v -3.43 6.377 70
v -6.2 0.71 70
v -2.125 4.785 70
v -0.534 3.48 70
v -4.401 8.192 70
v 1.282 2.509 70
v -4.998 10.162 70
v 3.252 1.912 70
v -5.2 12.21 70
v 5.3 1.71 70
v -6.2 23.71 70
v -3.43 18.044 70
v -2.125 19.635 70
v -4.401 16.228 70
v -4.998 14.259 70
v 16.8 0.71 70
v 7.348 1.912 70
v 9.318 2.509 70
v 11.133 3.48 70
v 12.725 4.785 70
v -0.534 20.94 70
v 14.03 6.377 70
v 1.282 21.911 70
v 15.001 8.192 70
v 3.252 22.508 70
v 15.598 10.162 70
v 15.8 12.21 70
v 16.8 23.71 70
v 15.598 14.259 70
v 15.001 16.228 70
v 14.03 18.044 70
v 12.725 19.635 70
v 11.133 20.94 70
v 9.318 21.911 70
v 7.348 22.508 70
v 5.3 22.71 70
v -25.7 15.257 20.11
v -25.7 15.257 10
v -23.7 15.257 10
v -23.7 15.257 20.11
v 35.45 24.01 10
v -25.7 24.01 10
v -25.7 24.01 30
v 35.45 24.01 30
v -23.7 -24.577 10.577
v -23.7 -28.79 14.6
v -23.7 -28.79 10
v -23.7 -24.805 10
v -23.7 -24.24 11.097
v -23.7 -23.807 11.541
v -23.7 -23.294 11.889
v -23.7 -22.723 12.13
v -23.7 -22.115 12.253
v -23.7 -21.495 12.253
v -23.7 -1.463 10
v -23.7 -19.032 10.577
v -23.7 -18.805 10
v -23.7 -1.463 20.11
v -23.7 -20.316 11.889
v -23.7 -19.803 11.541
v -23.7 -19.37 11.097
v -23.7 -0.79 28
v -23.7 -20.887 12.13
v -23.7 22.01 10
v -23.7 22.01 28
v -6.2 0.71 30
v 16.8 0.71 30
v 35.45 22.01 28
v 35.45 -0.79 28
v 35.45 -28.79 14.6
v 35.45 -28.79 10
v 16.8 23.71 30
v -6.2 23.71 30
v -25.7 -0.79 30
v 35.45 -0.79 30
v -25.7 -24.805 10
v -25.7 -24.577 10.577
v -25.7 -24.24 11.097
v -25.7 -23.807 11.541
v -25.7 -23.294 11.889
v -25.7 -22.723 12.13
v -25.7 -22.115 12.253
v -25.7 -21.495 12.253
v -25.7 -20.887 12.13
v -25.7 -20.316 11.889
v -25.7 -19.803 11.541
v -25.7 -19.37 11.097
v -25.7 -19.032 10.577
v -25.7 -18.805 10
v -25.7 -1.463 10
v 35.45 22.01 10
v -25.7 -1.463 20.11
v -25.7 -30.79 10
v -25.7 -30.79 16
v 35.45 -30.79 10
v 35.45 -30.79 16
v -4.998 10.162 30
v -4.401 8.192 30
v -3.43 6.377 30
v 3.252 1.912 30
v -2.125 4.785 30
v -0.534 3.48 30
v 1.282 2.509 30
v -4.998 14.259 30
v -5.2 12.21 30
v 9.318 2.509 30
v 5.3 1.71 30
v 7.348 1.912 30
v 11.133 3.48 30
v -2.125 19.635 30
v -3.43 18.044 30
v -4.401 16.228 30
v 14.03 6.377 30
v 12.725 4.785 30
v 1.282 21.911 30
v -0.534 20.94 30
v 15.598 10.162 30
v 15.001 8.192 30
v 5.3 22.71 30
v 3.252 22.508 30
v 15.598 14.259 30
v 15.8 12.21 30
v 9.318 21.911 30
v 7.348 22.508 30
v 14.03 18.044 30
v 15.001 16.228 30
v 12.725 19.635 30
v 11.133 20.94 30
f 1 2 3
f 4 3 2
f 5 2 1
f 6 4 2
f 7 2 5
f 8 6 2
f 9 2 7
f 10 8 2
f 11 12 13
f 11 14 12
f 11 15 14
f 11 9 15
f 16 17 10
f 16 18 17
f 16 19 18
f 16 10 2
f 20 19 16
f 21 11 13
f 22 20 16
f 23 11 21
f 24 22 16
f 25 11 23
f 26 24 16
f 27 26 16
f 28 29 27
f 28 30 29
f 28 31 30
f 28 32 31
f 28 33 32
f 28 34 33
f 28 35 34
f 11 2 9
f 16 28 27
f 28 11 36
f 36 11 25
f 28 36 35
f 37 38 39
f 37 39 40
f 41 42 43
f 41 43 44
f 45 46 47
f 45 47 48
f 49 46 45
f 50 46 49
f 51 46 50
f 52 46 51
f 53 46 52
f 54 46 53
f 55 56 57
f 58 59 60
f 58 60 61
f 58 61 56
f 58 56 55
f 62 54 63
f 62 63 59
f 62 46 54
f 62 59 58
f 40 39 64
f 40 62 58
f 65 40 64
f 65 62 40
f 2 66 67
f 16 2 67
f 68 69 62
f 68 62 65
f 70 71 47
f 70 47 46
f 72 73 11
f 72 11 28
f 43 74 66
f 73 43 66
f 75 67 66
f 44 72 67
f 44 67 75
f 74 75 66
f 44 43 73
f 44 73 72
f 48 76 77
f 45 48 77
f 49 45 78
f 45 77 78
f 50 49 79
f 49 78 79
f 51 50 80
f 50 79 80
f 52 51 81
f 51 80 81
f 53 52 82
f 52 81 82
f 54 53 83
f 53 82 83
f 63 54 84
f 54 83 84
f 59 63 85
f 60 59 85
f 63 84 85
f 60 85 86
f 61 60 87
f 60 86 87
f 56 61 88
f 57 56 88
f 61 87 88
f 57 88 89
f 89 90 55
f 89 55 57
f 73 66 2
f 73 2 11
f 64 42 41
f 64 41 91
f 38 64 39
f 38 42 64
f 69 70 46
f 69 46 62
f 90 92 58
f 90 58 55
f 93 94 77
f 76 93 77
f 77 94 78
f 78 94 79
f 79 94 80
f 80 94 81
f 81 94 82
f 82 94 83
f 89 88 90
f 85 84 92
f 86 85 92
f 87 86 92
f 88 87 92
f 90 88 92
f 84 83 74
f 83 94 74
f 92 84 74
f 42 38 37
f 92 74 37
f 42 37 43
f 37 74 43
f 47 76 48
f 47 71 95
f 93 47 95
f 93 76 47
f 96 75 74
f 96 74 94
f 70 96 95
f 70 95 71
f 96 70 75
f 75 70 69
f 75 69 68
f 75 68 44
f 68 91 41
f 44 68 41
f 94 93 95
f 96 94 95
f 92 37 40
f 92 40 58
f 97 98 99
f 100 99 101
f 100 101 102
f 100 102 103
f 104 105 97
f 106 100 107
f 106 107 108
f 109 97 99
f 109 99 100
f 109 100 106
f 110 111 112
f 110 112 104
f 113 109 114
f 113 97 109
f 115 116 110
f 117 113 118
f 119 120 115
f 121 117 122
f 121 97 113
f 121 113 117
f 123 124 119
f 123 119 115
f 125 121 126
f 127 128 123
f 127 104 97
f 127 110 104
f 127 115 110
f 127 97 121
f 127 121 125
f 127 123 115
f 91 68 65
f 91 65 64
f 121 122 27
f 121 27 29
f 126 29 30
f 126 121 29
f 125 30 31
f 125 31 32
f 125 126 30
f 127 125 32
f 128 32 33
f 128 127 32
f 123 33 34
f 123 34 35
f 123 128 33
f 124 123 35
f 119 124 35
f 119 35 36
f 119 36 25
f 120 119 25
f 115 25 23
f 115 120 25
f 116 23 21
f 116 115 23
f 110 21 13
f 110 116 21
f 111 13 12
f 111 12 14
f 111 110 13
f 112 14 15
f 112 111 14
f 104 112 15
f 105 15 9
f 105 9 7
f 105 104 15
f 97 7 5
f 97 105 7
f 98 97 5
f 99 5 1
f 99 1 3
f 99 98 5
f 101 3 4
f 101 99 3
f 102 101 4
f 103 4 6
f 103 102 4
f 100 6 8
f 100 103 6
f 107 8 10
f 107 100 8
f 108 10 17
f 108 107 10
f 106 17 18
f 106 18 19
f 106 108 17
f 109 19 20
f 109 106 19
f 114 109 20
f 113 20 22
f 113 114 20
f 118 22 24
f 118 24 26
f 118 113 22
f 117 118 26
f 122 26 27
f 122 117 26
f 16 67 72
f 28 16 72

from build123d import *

# Parameters (mm, degrees)
SKETCH004_W     = 61.15
SKETCH004_H     = 54.8
PAD001_DEPTH    = 20
POCKET003_DEPTH = 61.151
SKETCH006_R     = 3.34
SKETCH006_W     = 16.51
SKETCH006_H     = 11
POCKET004_DEPTH = 5
SKETCH007_R     = 3.34
SKETCH007_W     = 15.2570581741
SKETCH007_H     = 10.1100032783
POCKET005_DEPTH = 17
SKETCH008_W     = 23
SKETCH008_H     = 23
SKETCH008_R     = 10.5
PAD002_DEPTH    = 40
POCKET006_DEPTH = 61.151
PAD004_DEPTH    = 2


with BuildPart() as part:
    # Sketch004 → Pad001 (new body)
    with BuildSketch(Plane.XY):
        with Locations((4.8749828339, -3.3899418259)):
            Rectangle(SKETCH004_W, SKETCH004_H)
    extrude(amount=PAD001_DEPTH)

    # Sketch005 (on Face2 of Pad001) → Pocket003 (cut, through all)
    with BuildSketch(Plane.YZ.offset(35.4499828339)):
        Polygon((-30.7899418259, 20), (-0.7899418259, 20), (-30.7899418259, 6), align=None)
    extrude(amount=-POCKET003_DEPTH, mode=Mode.SUBTRACT)

    # Sketch006 (on Face3 of Pocket003) → Pocket004 (cut)
    with BuildSketch(Plane.YZ.offset(35.4499828339)):
        with Locations((-8.7709418259, -0.3499967217)):
            Circle(SKETCH006_R)
        with Locations((-21.8049418259, 0.1500032783)):
            Circle(SKETCH006_R)
        with Locations((6.7920581741, 4.6100032783)):
            Rectangle(SKETCH006_W, SKETCH006_H)
    extrude(amount=-POCKET004_DEPTH, mode=Mode.SUBTRACT)

    # Sketch007 (on Face2 of Pocket004) → Pocket005 (cut)
    with BuildSketch(Plane(origin=(-25.7000171661, 0, 0), x_dir=(0, -1, 0), z_dir=(-1, 0, 0))):
        with Locations((21.8049418259, -0.8499967217)):
            Circle(SKETCH007_R)
        with Locations((-7.6285290871, 5.0550016391)):
            Rectangle(SKETCH007_W, SKETCH007_H)
    extrude(amount=-POCKET005_DEPTH, mode=Mode.SUBTRACT)

    # Sketch008 (on Face5 of Pocket005) → Pad002 (join)
    with BuildSketch(Plane.XY.offset(20)):
        with Locations((5.2999828339, 12.2100581741)):
            Rectangle(SKETCH008_W, SKETCH008_H)
        with Locations((5.2999828339, 12.2100581741)):
            Circle(SKETCH008_R, mode=Mode.SUBTRACT)
    extrude(amount=PAD002_DEPTH)

    # Sketch010 (on Face3 of Pocket005) → Pocket006 (cut, through all)
    with BuildSketch(Plane.YZ.offset(35.4499828339)):
        Polygon((-28.7899418259, 0), (-28.7899418259, 4.6), (-0.7899418259, 18), (22.0100581741, 18), (22.0100581741, 0), align=None)
    extrude(amount=-POCKET006_DEPTH, mode=Mode.SUBTRACT)

    # Sketch011 (on Face2 of Pocket006) → Pad004 (join)
    with BuildSketch(Plane(origin=(-25.7000171661, 0, 0), x_dir=(0, -1, 0), z_dir=(-1, 0, 0))):
        with BuildLine():
            Line((-22.0100581741, 0), (-22.0100581741, 18))
            Line((-22.0100581741, 18), (0.7899418259, 18))
            Line((0.7899418259, 18), (28.7899418259, 4.6))
            Line((28.7899418259, 4.6), (28.7899418259, 0))
            Line((24.8049418259, 0), (28.7899418259, 0))
            ThreePointArc((24.8049418259, 0), (21.8049418259, 2.2680947501), (18.8049418259, 0))
            Line((1.4629418259, 0), (18.8049418259, 0))
            Line((1.4629418259, 10.1100032783), (1.4629418259, 0))
            Line((-15.2570581741, 10.1100032783), (1.4629418259, 10.1100032783))
            Line((-15.2570581741, 0), (-15.2570581741, 10.1100032783))
            Line((-22.0100581741, 0), (-15.2570581741, 0))
        make_face()
    extrude(amount=-PAD004_DEPTH)


with BuildPart() as part_1:
    # Body001 placement: moved
    add(part.part.moved(Location((0, 0, 10))))


solid = part_1.part
